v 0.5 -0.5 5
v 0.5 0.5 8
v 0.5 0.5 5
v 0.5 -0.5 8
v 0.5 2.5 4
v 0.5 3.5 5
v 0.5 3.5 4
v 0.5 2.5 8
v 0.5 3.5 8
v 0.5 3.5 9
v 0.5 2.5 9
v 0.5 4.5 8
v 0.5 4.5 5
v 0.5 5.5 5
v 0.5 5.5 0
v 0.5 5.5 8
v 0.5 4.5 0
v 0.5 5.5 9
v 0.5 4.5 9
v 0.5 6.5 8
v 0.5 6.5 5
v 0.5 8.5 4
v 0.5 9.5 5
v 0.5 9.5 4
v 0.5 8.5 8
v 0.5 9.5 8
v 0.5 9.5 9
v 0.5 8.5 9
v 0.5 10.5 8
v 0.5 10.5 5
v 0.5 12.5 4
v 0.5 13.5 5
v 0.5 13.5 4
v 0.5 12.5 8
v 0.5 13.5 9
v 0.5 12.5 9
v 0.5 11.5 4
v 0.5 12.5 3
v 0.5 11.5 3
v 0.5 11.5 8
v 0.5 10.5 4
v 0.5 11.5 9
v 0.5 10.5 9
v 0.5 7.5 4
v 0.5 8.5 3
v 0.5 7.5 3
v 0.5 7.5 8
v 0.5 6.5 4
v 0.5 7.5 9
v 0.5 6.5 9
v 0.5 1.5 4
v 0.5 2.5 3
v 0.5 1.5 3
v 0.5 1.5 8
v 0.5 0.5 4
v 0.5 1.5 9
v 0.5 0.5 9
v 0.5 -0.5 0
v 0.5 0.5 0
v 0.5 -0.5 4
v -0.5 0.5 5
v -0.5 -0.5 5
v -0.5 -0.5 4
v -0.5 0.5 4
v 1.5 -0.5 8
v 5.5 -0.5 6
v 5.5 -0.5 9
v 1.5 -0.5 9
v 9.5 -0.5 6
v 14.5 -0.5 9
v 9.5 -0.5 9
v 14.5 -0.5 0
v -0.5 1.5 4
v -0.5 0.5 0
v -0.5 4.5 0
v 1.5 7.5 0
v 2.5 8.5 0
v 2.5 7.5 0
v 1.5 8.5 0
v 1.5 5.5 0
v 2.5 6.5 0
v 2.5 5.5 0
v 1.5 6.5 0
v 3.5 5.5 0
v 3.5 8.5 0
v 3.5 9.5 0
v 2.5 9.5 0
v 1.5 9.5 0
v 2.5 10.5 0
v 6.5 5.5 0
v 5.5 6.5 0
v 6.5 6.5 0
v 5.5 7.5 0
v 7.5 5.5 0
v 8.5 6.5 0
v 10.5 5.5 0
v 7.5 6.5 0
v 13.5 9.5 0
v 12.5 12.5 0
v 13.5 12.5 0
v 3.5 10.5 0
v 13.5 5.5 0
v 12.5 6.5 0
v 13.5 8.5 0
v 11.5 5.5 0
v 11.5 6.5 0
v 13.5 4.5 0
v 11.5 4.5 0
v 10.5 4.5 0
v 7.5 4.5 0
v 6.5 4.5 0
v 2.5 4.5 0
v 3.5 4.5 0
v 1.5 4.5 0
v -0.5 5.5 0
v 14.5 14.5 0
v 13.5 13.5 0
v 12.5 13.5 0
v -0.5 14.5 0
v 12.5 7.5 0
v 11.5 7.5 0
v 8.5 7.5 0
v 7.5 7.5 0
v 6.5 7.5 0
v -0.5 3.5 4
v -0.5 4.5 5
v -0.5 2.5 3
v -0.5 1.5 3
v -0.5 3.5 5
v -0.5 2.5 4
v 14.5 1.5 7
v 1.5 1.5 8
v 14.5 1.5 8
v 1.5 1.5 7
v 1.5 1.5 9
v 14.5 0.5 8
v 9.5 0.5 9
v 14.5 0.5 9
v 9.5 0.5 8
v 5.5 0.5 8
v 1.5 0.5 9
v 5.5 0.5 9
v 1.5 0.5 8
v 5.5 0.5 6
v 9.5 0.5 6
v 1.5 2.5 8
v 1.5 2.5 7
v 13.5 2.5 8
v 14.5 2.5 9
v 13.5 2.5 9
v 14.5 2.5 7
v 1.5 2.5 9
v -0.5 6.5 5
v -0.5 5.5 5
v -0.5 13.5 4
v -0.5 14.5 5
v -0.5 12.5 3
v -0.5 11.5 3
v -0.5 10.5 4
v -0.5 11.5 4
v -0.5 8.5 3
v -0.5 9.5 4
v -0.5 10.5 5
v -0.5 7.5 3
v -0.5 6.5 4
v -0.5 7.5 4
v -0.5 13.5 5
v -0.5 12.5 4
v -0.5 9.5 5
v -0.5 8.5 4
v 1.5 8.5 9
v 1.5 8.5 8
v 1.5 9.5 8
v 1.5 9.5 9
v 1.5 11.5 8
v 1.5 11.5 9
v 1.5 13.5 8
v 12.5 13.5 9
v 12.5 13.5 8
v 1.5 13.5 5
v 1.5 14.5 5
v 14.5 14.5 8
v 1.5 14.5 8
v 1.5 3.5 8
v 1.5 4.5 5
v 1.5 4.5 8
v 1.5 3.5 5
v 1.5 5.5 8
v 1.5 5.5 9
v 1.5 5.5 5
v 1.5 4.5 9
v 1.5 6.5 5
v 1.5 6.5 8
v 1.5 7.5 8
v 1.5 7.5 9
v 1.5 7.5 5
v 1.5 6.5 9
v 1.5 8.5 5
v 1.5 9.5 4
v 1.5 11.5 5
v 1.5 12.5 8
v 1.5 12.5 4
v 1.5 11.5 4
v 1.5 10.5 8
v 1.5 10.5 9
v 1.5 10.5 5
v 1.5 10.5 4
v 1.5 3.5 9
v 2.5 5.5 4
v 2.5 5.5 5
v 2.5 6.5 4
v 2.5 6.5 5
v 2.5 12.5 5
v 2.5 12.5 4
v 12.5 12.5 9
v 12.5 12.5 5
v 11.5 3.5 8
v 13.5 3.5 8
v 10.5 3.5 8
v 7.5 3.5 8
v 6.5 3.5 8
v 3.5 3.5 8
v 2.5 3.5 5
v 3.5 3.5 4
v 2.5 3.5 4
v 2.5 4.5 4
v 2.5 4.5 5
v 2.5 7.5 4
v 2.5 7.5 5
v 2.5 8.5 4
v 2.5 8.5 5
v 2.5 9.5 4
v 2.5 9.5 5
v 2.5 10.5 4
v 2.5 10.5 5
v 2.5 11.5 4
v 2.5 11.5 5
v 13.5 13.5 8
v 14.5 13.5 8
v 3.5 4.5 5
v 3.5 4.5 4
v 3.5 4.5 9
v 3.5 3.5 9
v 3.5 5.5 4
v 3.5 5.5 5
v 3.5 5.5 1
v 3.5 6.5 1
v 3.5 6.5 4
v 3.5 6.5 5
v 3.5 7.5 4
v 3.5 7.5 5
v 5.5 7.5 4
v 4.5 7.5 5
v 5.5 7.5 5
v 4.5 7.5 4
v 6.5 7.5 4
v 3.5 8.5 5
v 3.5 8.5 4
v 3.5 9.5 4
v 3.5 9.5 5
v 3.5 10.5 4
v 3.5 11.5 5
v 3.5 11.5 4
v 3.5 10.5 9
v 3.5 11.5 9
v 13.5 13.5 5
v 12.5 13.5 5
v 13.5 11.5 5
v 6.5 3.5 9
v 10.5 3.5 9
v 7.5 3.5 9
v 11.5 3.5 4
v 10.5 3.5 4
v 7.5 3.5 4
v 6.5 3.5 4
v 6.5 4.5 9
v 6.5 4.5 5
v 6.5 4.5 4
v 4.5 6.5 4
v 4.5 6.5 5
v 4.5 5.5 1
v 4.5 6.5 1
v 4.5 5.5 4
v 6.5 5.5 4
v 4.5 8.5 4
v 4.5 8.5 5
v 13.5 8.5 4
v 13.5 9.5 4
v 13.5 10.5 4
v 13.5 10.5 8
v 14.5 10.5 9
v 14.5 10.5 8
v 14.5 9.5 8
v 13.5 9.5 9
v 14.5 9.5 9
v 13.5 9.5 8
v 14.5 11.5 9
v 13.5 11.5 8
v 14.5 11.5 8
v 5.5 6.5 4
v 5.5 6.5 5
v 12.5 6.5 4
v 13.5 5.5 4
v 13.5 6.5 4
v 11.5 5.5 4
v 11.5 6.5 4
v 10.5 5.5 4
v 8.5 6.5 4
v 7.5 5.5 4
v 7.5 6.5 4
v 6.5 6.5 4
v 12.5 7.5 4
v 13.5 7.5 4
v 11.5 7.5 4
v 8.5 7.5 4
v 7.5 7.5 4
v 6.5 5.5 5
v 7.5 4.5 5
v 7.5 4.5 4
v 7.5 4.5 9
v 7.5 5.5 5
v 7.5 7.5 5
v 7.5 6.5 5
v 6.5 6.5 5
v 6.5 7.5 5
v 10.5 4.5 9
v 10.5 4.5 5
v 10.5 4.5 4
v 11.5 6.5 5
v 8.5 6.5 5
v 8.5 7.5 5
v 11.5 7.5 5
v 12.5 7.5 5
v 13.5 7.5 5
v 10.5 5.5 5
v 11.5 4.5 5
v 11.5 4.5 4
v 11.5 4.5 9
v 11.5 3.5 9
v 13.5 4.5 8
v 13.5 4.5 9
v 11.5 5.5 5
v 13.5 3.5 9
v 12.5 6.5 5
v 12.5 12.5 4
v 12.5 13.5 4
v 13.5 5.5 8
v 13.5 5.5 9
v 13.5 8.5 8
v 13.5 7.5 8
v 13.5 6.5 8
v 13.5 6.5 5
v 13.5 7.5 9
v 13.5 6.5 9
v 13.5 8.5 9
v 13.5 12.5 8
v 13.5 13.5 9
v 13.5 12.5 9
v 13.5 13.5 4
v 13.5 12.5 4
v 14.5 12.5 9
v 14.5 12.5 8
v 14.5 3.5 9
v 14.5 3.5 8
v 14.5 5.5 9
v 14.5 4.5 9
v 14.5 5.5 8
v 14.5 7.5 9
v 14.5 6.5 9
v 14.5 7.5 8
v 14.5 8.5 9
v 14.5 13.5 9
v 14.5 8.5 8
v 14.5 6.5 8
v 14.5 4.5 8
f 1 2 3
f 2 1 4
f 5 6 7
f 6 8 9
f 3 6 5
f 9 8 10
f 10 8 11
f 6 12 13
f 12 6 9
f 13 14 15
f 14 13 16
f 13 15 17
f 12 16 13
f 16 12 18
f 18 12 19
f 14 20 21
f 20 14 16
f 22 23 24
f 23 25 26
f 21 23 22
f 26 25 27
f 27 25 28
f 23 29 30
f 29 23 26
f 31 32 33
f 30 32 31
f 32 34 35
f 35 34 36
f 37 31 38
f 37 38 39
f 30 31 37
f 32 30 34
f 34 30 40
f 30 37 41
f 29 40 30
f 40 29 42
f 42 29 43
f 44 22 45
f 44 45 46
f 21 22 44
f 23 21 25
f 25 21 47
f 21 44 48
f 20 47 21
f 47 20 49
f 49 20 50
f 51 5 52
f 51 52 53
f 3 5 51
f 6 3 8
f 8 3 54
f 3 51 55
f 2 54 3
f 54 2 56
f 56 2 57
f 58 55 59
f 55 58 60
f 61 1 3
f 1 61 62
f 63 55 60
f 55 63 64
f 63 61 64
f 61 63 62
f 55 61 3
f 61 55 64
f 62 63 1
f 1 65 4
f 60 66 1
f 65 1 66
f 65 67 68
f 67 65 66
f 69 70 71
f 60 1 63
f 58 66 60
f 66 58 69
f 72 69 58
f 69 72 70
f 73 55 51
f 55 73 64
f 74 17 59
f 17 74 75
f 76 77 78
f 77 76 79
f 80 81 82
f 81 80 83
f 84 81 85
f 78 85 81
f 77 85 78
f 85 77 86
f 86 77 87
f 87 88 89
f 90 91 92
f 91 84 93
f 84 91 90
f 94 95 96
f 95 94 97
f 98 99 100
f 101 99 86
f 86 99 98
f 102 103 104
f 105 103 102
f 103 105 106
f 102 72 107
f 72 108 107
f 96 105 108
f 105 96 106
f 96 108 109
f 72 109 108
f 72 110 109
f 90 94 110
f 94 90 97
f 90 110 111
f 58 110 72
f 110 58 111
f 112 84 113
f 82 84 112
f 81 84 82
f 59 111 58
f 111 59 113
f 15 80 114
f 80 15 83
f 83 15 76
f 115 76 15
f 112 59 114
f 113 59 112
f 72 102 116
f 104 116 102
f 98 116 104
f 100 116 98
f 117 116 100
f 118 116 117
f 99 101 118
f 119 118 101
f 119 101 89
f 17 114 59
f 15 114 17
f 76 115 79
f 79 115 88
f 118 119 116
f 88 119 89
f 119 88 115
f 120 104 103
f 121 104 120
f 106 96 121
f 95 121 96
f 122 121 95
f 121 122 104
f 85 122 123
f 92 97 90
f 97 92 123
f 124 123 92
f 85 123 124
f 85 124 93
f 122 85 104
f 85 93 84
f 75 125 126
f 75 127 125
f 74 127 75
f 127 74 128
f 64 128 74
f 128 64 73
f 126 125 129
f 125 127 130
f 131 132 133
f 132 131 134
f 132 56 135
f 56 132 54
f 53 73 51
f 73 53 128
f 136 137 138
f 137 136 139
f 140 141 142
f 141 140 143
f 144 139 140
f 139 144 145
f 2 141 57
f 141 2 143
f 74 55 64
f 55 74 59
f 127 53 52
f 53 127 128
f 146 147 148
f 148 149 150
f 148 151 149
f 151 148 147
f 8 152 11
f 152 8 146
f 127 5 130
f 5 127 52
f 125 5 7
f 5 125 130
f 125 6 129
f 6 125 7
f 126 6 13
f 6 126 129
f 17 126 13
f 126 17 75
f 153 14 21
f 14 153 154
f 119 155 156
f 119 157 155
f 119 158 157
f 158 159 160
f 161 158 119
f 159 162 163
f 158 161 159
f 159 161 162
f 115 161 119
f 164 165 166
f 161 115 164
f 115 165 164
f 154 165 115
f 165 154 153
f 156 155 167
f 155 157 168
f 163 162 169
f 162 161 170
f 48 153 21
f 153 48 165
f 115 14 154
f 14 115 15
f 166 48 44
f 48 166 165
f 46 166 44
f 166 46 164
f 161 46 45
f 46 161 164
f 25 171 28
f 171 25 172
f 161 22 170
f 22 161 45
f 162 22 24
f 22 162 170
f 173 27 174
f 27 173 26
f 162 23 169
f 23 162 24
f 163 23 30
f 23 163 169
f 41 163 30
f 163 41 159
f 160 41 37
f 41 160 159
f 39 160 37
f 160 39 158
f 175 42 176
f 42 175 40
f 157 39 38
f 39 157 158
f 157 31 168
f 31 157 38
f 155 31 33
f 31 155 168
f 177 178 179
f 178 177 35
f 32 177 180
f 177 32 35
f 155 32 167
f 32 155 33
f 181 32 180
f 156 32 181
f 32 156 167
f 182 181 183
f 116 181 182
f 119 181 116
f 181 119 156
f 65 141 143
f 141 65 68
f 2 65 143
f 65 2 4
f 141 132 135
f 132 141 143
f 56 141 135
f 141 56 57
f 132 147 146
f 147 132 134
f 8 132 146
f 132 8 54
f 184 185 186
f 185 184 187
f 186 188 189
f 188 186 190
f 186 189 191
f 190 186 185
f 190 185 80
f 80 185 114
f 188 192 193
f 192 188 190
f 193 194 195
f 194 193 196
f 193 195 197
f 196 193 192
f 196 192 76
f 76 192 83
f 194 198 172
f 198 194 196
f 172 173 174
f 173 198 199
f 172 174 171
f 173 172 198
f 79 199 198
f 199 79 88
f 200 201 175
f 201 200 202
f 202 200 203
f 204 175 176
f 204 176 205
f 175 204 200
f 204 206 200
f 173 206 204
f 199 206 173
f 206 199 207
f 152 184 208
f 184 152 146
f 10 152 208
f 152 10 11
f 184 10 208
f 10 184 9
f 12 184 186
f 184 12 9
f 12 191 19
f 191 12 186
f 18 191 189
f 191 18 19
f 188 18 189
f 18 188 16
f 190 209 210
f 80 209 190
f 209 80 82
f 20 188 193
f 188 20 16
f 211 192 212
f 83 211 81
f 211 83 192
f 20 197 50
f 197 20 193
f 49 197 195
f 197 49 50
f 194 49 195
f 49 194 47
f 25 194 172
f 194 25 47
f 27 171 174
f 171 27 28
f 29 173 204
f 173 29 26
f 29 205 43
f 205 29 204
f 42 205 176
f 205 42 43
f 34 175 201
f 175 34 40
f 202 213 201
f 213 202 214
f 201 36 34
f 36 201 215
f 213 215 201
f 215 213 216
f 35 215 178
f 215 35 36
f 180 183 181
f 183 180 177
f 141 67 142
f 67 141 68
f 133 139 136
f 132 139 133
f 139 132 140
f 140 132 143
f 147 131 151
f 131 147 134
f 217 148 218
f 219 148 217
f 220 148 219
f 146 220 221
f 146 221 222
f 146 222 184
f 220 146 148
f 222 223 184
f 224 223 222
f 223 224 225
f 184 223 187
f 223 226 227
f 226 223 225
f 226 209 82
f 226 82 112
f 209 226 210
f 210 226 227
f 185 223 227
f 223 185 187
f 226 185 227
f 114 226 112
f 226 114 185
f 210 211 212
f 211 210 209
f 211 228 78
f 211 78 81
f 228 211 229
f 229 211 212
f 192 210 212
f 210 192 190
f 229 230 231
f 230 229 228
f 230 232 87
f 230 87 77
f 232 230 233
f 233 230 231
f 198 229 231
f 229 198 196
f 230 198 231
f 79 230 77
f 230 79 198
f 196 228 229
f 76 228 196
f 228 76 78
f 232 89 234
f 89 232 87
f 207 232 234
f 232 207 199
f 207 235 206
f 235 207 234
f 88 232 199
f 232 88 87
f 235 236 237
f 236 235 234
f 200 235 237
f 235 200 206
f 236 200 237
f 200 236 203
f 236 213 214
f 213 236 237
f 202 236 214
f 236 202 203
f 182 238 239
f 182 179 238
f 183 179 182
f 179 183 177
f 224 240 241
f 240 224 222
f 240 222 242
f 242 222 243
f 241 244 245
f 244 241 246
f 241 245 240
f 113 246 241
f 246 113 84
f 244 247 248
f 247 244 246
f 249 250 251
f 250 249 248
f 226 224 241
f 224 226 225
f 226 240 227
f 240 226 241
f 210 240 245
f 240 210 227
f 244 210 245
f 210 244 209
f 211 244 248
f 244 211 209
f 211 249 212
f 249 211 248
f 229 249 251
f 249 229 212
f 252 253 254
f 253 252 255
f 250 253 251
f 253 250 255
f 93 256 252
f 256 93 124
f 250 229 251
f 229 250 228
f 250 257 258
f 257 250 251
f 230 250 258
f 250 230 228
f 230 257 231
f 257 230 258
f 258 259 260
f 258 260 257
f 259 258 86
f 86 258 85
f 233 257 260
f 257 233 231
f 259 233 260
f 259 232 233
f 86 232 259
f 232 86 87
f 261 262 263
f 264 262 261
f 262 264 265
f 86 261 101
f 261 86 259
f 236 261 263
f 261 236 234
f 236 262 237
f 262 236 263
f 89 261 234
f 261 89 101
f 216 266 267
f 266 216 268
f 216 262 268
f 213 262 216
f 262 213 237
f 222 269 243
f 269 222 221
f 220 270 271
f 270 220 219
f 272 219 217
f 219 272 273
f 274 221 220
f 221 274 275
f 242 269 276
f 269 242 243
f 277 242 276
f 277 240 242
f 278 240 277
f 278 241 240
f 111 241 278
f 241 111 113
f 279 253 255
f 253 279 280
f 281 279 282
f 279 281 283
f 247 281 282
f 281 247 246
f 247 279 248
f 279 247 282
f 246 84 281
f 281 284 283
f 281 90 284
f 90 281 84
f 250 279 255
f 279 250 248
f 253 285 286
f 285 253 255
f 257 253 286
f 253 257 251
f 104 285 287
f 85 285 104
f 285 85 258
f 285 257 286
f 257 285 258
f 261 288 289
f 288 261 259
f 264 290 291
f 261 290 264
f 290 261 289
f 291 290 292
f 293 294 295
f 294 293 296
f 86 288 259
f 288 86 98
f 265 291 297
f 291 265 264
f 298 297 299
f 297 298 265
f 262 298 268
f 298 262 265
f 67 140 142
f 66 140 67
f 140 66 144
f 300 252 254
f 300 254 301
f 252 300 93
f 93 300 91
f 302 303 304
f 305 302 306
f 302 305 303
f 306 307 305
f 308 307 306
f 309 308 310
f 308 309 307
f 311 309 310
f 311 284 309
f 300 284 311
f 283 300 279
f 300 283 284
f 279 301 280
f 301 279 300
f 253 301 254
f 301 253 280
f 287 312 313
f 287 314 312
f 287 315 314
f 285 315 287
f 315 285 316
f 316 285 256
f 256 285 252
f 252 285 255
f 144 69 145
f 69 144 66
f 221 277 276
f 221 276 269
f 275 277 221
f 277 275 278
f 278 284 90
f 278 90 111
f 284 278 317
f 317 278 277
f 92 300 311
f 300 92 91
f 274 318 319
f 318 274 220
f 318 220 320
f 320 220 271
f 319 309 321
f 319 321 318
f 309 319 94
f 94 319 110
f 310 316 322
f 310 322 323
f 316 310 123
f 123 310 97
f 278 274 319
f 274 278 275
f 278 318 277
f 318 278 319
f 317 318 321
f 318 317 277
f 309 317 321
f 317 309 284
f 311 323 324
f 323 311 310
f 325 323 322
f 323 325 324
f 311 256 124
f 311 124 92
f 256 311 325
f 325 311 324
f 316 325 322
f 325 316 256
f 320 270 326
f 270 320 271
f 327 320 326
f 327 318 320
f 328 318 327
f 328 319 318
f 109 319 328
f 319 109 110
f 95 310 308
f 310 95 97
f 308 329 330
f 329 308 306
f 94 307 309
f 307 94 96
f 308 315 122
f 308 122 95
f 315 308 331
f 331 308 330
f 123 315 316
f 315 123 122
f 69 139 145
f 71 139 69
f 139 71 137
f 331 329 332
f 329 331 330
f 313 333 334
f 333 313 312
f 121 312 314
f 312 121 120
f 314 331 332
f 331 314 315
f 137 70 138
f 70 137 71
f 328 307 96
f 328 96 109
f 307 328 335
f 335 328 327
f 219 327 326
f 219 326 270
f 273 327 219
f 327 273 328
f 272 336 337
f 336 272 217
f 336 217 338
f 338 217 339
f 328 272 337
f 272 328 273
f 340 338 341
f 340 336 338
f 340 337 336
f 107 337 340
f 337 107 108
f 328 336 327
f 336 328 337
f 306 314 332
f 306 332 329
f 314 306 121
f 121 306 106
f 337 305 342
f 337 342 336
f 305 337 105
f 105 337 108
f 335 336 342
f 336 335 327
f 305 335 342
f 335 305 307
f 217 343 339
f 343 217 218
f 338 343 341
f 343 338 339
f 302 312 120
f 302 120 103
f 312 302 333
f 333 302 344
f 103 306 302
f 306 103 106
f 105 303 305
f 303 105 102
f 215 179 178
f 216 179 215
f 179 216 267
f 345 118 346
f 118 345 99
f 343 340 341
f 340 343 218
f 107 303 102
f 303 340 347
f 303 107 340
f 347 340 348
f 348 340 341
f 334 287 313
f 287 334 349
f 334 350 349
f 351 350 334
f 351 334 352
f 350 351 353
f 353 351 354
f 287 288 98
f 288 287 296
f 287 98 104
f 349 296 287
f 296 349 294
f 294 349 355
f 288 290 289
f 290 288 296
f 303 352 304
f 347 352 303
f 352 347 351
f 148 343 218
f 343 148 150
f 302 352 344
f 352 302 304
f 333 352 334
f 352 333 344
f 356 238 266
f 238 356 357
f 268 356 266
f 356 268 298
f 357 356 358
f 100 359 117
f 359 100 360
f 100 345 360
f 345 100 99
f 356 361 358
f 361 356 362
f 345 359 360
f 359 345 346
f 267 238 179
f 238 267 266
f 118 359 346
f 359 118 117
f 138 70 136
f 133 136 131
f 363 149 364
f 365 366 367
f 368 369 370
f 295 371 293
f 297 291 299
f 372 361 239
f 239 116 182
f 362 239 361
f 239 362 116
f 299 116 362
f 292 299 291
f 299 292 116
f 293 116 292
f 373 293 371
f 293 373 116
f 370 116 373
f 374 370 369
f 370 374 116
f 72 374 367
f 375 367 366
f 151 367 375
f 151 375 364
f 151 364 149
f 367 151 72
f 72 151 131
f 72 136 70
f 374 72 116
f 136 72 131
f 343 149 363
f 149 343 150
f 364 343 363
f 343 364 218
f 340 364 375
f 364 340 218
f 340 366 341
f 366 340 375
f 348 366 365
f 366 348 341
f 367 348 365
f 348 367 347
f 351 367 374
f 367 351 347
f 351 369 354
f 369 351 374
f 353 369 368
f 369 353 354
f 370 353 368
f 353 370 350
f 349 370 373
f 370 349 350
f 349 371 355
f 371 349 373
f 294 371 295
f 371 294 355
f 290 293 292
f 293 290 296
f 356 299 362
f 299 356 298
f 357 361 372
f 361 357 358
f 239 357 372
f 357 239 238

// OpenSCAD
union() {
    translate([0, 0, 4.5]) color([1, 0, 0]) cube([1, 1, 1], center=true);
    translate([0, 1, 2.0]) cube([1, 1, 4], center=true);
    translate([0, 2, 1.5]) cube([1, 1, 3], center=true);
    translate([0, 3, 2.0]) cube([1, 1, 4], center=true);
    translate([0, 4, 2.5]) cube([1, 1, 5], center=true);
    translate([0, 6, 2.5]) cube([1, 1, 5], center=true);
    translate([0, 7, 2.0]) cube([1, 1, 4], center=true);
    translate([0, 8, 1.5]) cube([1, 1, 3], center=true);
    translate([0, 9, 2.0]) cube([1, 1, 4], center=true);
    translate([0, 10, 2.5]) cube([1, 1, 5], center=true);
    translate([0, 11, 2.0]) cube([1, 1, 4], center=true);
    translate([0, 12, 1.5]) cube([1, 1, 3], center=true);
    translate([0, 13, 2.0]) cube([1, 1, 4], center=true);
    translate([0, 14, 2.5]) cube([1, 1, 5], center=true);
    translate([1, 0, 4.0]) cube([1, 1, 8], center=true);
    translate([1, 1, 4.5]) cube([1, 1, 9], center=true);
    translate([1, 2, 4.0]) cube([1, 1, 8], center=true);
    translate([1, 3, 4.5]) cube([1, 1, 9], center=true);
    translate([1, 4, 4.0]) cube([1, 1, 8], center=true);
    translate([1, 5, 4.5]) cube([1, 1, 9], center=true);
    translate([1, 6, 4.0]) cube([1, 1, 8], center=true);
    translate([1, 7, 4.5]) cube([1, 1, 9], center=true);
    translate([1, 8, 4.0]) cube([1, 1, 8], center=true);
    translate([1, 9, 4.5]) cube([1, 1, 9], center=true);
    translate([1, 10, 4.0]) cube([1, 1, 8], center=true);
    translate([1, 11, 4.5]) cube([1, 1, 9], center=true);
    translate([1, 12, 4.0]) cube([1, 1, 8], center=true);
    translate([1, 13, 4.5]) cube([1, 1, 9], center=true);
    translate([1, 14, 2.5]) cube([1, 1, 5], center=true);
    translate([2, 0, 4.5]) cube([1, 1, 9], center=true);
    translate([2, 1, 4.0]) cube([1, 1, 8], center=true);
    translate([2, 2, 3.5]) cube([1, 1, 7], center=true);
    translate([2, 3, 4.0]) cube([1, 1, 8], center=true);
    translate([2, 4, 2.5]) cube([1, 1, 5], center=true);
    translate([2, 6, 2.5]) cube([1, 1, 5], center=true);
    translate([2, 8, 2.5]) cube([1, 1, 5], center=true);
    translate([2, 10, 2.0]) cube([1, 1, 4], center=true);
    translate([2, 11, 2.5]) cube([1, 1, 5], center=true);
    translate([2, 12, 2.0]) cube([1, 1, 4], center=true);
    translate([2, 13, 4.5]) cube([1, 1, 9], center=true);
    translate([2, 14, 4.0]) cube([1, 1, 8], center=true);
    translate([3, 0, 4.5]) cube([1, 1, 9], center=true);
    translate([3, 1, 4.0]) cube([1, 1, 8], center=true);
    translate([3, 2, 3.5]) cube([1, 1, 7], center=true);
    translate([3, 3, 4.0]) cube([1, 1, 8], center=true);
    translate([3, 4, 2.0]) cube([1, 1, 4], center=true);
    translate([3, 5, 2.5]) cube([1, 1, 5], center=true);
    translate([3, 6, 2.0]) cube([1, 1, 4], center=true);
    translate([3, 7, 2.5]) cube([1, 1, 5], center=true);
    translate([3, 8, 2.0]) cube([1, 1, 4], center=true);
    translate([3, 9, 2.5]) cube([1, 1, 5], center=true);
    translate([3, 11, 2.0]) cube([1, 1, 4], center=true);
    translate([3, 12, 2.5]) cube([1, 1, 5], center=true);
    translate([3, 13, 4.5]) cube([1, 1, 9], center=true);
    translate([3, 14, 4.0]) cube([1, 1, 8], center=true);
    translate([4, 0, 4.5]) cube([1, 1, 9], center=true);
    translate([4, 1, 4.0]) cube([1, 1, 8], center=true);
    translate([4, 2, 3.5]) cube([1, 1, 7], center=true);
    translate([4, 3, 4.0]) cube([1, 1, 8], center=true);
    translate([4, 4, 4.5]) cube([1, 1, 9], center=true);
    translate([4, 6, 0.5]) cube([1, 1, 1], center=true);
    translate([4, 7, 2.0]) cube([1, 1, 4], center=true);
    translate([4, 8, 2.5]) cube([1, 1, 5], center=true);
    translate([4, 10, 2.0]) cube([1, 1, 4], center=true);
    translate([4, 11, 4.5]) cube([1, 1, 9], center=true);
    translate([4, 12, 2.5]) cube([1, 1, 5], center=true);
    translate([4, 13, 4.5]) cube([1, 1, 9], center=true);
    translate([4, 14, 4.0]) cube([1, 1, 8], center=true);
    translate([5, 0, 4.5]) cube([1, 1, 9], center=true);
    translate([5, 1, 4.0]) cube([1, 1, 8], center=true);
    translate([5, 2, 3.5]) cube([1, 1, 7], center=true);
    translate([5, 3, 4.0]) cube([1, 1, 8], center=true);
    translate([5, 4, 4.5]) cube([1, 1, 9], center=true);
    translate([5, 6, 2.0]) cube([1, 1, 4], center=true);
    translate([5, 7, 2.5]) cube([1, 1, 5], center=true);
    translate([5, 8, 2.0]) cube([1, 1, 4], center=true);
    translate([5, 10, 2.0]) cube([1, 1, 4], center=true);
    translate([5, 11, 4.5]) cube([1, 1, 9], center=true);
    translate([5, 12, 2.5]) cube([1, 1, 5], center=true);
    translate([5, 13, 4.5]) cube([1, 1, 9], center=true);
    translate([5, 14, 4.0]) cube([1, 1, 8], center=true);
    translate([6, 0, 3.0]) cube([1, 1, 6], center=true);
    translate([6, 1, 4.0]) cube([1, 1, 8], center=true);
    translate([6, 2, 3.5]) cube([1, 1, 7], center=true);
    translate([6, 3, 4.0]) cube([1, 1, 8], center=true);
    translate([6, 4, 4.5]) cube([1, 1, 9], center=true);
    translate([6, 6, 2.0]) cube([1, 1, 4], center=true);
    translate([6, 8, 2.0]) cube([1, 1, 4], center=true);
    translate([6, 10, 2.0]) cube([1, 1, 4], center=true);
    translate([6, 11, 4.5]) cube([1, 1, 9], center=true);
    translate([6, 12, 2.5]) cube([1, 1, 5], center=true);
    translate([6, 13, 4.5]) cube([1, 1, 9], center=true);
    translate([6, 14, 4.0]) cube([1, 1, 8], center=true);
    translate([7, 0, 3.0]) cube([1, 1, 6], center=true);
    translate([7, 1, 4.0]) cube([1, 1, 8], center=true);
    translate([7, 2, 3.5]) cube([1, 1, 7], center=true);
    translate([7, 3, 4.0]) cube([1, 1, 8], center=true);
    translate([7, 4, 2.0]) cube([1, 1, 4], center=true);
    translate([7, 5, 2.5]) cube([1, 1, 5], center=true);
    translate([7, 6, 2.0]) cube([1, 1, 4], center=true);
    translate([7, 7, 2.5]) cube([1, 1, 5], center=true);
    translate([7, 8, 2.0]) cube([1, 1, 4], center=true);
    translate([7, 10, 2.0]) cube([1, 1, 4], center=true);
    translate([7, 11, 4.5]) cube([1, 1, 9], center=true);
    translate([7, 12, 2.5]) cube([1, 1, 5], center=true);
    translate([7, 13, 4.5]) cube([1, 1, 9], center=true);
    translate([7, 14, 4.0]) cube([1, 1, 8], center=true);
    translate([8, 0, 3.0]) cube([1, 1, 6], center=true);
    translate([8, 1, 4.0]) cube([1, 1, 8], center=true);
    translate([8, 2, 3.5]) cube([1, 1, 7], center=true);
    translate([8, 3, 4.0]) cube([1, 1, 8], center=true);
    translate([8, 4, 4.5]) cube([1, 1, 9], center=true);
    translate([8, 6, 2.0]) cube([1, 1, 4], center=true);
    translate([8, 8, 2.0]) cube([1, 1, 4], center=true);
    translate([8, 10, 2.0]) cube([1, 1, 4], center=true);
    translate([8, 11, 4.5]) cube([1, 1, 9], center=true);
    translate([8, 12, 2.5]) cube([1, 1, 5], center=true);
    translate([8, 13, 4.5]) cube([1, 1, 9], center=true);
    translate([8, 14, 4.0]) cube([1, 1, 8], center=true);
    translate([9, 0, 3.0]) cube([1, 1, 6], center=true);
    translate([9, 1, 4.0]) cube([1, 1, 8], center=true);
    translate([9, 2, 3.5]) cube([1, 1, 7], center=true);
    translate([9, 3, 4.0]) cube([1, 1, 8], center=true);
    translate([9, 4, 4.5]) cube([1, 1, 9], center=true);
    translate([9, 6, 2.0]) cube([1, 1, 4], center=true);
    translate([9, 7, 2.5]) cube([1, 1, 5], center=true);
    translate([9, 8, 2.0]) cube([1, 1, 4], center=true);
    translate([9, 10, 2.0]) cube([1, 1, 4], center=true);
    translate([9, 11, 4.5]) cube([1, 1, 9], center=true);
    translate([9, 12, 2.5]) cube([1, 1, 5], center=true);
    translate([9, 13, 4.5]) cube([1, 1, 9], center=true);
    translate([9, 14, 4.0]) cube([1, 1, 8], center=true);
    translate([10, 0, 4.5]) cube([1, 1, 9], center=true);
    translate([10, 1, 4.0]) cube([1, 1, 8], center=true);
    translate([10, 2, 3.5]) cube([1, 1, 7], center=true);
    translate([10, 3, 4.0]) cube([1, 1, 8], center=true);
    translate([10, 4, 4.5]) cube([1, 1, 9], center=true);
    translate([10, 6, 2.0]) cube([1, 1, 4], center=true);
    translate([10, 7, 2.5]) cube([1, 1, 5], center=true);
    translate([10, 8, 2.0]) cube([1, 1, 4], center=true);
    translate([10, 10, 2.0]) cube([1, 1, 4], center=true);
    translate([10, 11, 4.5]) cube([1, 1, 9], center=true);
    translate([10, 12, 2.5]) cube([1, 1, 5], center=true);
    translate([10, 13, 4.5]) cube([1, 1, 9], center=true);
    translate([10, 14, 4.0]) cube([1, 1, 8], center=true);
    translate([11, 0, 4.5]) cube([1, 1, 9], center=true);
    translate([11, 1, 4.0]) cube([1, 1, 8], center=true);
    translate([11, 2, 3.5]) cube([1, 1, 7], center=true);
    translate([11, 3, 4.0]) cube([1, 1, 8], center=true);
    translate([11, 4, 2.0]) cube([1, 1, 4], center=true);
    translate([11, 5, 2.5]) cube([1, 1, 5], center=true);
    translate([11, 6, 2.0]) cube([1, 1, 4], center=true);
    translate([11, 7, 2.5]) cube([1, 1, 5], center=true);
    translate([11, 8, 2.0]) cube([1, 1, 4], center=true);
    translate([11, 10, 2.0]) cube([1, 1, 4], center=true);
    translate([11, 11, 4.5]) cube([1, 1, 9], center=true);
    translate([11, 12, 2.5]) cube([1, 1, 5], center=true);
    translate([11, 13, 4.5]) cube([1, 1, 9], center=true);
    translate([11, 14, 4.0]) cube([1, 1, 8], center=true);
    translate([12, 0, 4.5]) cube([1, 1, 9], center=true);
    translate([12, 1, 4.0]) cube([1, 1, 8], center=true);
    translate([12, 2, 3.5]) cube([1, 1, 7], center=true);
    translate([12, 3, 4.0]) cube([1, 1, 8], center=true);
    translate([12, 4, 4.5]) cube([1, 1, 9], center=true);
    translate([12, 6, 2.0]) cube([1, 1, 4], center=true);
    translate([12, 8, 2.0]) cube([1, 1, 4], center=true);
    translate([12, 10, 2.0]) cube([1, 1, 4], center=true);
    translate([12, 11, 4.5]) cube([1, 1, 9], center=true);
    translate([12, 12, 2.5]) cube([1, 1, 5], center=true);
    translate([12, 13, 4.5]) cube([1, 1, 9], center=true);
    translate([12, 14, 4.0]) cube([1, 1, 8], center=true);
    translate([13, 0, 4.5]) cube([1, 1, 9], center=true);
    translate([13, 1, 4.0]) cube([1, 1, 8], center=true);
    translate([13, 2, 3.5]) cube([1, 1, 7], center=true);
    translate([13, 3, 4.0]) cube([1, 1, 8], center=true);
    translate([13, 4, 4.5]) cube([1, 1, 9], center=true);
    translate([13, 6, 2.0]) cube([1, 1, 4], center=true);
    translate([13, 7, 2.5]) cube([1, 1, 5], center=true);
    translate([13, 8, 2.0]) cube([1, 1, 4], center=true);
    translate([13, 10, 2.0]) cube([1, 1, 4], center=true);
    translate([13, 11, 4.5]) cube([1, 1, 9], center=true);
    translate([13, 12, 2.5]) cube([1, 1, 5], center=true);
    translate([13, 13, 4.5]) color([0, 0, 1]) cube([1, 1, 1], center=true);
    translate([13, 14, 4.0]) cube([1, 1, 8], center=true);
    translate([14, 0, 4.5]) cube([1, 1, 9], center=true);
    translate([14, 1, 4.0]) cube([1, 1, 8], center=true);
    translate([14, 2, 3.5]) cube([1, 1, 7], center=true);
    translate([14, 3, 4.5]) cube([1, 1, 9], center=true);
    translate([14, 4, 4.0]) cube([1, 1, 8], center=true);
    translate([14, 5, 4.5]) cube([1, 1, 9], center=true);
    translate([14, 6, 4.0]) cube([1, 1, 8], center=true);
    translate([14, 7, 4.5]) cube([1, 1, 9], center=true);
    translate([14, 8, 4.0]) cube([1, 1, 8], center=true);
    translate([14, 9, 4.5]) cube([1, 1, 9], center=true);
    translate([14, 10, 4.0]) cube([1, 1, 8], center=true);
    translate([14, 11, 4.5]) cube([1, 1, 9], center=true);
    translate([14, 12, 4.0]) cube([1, 1, 8], center=true);
    translate([14, 13, 4.5]) cube([1, 1, 9], center=true);
    translate([14, 14, 4.0]) cube([1, 1, 8], center=true);
}
